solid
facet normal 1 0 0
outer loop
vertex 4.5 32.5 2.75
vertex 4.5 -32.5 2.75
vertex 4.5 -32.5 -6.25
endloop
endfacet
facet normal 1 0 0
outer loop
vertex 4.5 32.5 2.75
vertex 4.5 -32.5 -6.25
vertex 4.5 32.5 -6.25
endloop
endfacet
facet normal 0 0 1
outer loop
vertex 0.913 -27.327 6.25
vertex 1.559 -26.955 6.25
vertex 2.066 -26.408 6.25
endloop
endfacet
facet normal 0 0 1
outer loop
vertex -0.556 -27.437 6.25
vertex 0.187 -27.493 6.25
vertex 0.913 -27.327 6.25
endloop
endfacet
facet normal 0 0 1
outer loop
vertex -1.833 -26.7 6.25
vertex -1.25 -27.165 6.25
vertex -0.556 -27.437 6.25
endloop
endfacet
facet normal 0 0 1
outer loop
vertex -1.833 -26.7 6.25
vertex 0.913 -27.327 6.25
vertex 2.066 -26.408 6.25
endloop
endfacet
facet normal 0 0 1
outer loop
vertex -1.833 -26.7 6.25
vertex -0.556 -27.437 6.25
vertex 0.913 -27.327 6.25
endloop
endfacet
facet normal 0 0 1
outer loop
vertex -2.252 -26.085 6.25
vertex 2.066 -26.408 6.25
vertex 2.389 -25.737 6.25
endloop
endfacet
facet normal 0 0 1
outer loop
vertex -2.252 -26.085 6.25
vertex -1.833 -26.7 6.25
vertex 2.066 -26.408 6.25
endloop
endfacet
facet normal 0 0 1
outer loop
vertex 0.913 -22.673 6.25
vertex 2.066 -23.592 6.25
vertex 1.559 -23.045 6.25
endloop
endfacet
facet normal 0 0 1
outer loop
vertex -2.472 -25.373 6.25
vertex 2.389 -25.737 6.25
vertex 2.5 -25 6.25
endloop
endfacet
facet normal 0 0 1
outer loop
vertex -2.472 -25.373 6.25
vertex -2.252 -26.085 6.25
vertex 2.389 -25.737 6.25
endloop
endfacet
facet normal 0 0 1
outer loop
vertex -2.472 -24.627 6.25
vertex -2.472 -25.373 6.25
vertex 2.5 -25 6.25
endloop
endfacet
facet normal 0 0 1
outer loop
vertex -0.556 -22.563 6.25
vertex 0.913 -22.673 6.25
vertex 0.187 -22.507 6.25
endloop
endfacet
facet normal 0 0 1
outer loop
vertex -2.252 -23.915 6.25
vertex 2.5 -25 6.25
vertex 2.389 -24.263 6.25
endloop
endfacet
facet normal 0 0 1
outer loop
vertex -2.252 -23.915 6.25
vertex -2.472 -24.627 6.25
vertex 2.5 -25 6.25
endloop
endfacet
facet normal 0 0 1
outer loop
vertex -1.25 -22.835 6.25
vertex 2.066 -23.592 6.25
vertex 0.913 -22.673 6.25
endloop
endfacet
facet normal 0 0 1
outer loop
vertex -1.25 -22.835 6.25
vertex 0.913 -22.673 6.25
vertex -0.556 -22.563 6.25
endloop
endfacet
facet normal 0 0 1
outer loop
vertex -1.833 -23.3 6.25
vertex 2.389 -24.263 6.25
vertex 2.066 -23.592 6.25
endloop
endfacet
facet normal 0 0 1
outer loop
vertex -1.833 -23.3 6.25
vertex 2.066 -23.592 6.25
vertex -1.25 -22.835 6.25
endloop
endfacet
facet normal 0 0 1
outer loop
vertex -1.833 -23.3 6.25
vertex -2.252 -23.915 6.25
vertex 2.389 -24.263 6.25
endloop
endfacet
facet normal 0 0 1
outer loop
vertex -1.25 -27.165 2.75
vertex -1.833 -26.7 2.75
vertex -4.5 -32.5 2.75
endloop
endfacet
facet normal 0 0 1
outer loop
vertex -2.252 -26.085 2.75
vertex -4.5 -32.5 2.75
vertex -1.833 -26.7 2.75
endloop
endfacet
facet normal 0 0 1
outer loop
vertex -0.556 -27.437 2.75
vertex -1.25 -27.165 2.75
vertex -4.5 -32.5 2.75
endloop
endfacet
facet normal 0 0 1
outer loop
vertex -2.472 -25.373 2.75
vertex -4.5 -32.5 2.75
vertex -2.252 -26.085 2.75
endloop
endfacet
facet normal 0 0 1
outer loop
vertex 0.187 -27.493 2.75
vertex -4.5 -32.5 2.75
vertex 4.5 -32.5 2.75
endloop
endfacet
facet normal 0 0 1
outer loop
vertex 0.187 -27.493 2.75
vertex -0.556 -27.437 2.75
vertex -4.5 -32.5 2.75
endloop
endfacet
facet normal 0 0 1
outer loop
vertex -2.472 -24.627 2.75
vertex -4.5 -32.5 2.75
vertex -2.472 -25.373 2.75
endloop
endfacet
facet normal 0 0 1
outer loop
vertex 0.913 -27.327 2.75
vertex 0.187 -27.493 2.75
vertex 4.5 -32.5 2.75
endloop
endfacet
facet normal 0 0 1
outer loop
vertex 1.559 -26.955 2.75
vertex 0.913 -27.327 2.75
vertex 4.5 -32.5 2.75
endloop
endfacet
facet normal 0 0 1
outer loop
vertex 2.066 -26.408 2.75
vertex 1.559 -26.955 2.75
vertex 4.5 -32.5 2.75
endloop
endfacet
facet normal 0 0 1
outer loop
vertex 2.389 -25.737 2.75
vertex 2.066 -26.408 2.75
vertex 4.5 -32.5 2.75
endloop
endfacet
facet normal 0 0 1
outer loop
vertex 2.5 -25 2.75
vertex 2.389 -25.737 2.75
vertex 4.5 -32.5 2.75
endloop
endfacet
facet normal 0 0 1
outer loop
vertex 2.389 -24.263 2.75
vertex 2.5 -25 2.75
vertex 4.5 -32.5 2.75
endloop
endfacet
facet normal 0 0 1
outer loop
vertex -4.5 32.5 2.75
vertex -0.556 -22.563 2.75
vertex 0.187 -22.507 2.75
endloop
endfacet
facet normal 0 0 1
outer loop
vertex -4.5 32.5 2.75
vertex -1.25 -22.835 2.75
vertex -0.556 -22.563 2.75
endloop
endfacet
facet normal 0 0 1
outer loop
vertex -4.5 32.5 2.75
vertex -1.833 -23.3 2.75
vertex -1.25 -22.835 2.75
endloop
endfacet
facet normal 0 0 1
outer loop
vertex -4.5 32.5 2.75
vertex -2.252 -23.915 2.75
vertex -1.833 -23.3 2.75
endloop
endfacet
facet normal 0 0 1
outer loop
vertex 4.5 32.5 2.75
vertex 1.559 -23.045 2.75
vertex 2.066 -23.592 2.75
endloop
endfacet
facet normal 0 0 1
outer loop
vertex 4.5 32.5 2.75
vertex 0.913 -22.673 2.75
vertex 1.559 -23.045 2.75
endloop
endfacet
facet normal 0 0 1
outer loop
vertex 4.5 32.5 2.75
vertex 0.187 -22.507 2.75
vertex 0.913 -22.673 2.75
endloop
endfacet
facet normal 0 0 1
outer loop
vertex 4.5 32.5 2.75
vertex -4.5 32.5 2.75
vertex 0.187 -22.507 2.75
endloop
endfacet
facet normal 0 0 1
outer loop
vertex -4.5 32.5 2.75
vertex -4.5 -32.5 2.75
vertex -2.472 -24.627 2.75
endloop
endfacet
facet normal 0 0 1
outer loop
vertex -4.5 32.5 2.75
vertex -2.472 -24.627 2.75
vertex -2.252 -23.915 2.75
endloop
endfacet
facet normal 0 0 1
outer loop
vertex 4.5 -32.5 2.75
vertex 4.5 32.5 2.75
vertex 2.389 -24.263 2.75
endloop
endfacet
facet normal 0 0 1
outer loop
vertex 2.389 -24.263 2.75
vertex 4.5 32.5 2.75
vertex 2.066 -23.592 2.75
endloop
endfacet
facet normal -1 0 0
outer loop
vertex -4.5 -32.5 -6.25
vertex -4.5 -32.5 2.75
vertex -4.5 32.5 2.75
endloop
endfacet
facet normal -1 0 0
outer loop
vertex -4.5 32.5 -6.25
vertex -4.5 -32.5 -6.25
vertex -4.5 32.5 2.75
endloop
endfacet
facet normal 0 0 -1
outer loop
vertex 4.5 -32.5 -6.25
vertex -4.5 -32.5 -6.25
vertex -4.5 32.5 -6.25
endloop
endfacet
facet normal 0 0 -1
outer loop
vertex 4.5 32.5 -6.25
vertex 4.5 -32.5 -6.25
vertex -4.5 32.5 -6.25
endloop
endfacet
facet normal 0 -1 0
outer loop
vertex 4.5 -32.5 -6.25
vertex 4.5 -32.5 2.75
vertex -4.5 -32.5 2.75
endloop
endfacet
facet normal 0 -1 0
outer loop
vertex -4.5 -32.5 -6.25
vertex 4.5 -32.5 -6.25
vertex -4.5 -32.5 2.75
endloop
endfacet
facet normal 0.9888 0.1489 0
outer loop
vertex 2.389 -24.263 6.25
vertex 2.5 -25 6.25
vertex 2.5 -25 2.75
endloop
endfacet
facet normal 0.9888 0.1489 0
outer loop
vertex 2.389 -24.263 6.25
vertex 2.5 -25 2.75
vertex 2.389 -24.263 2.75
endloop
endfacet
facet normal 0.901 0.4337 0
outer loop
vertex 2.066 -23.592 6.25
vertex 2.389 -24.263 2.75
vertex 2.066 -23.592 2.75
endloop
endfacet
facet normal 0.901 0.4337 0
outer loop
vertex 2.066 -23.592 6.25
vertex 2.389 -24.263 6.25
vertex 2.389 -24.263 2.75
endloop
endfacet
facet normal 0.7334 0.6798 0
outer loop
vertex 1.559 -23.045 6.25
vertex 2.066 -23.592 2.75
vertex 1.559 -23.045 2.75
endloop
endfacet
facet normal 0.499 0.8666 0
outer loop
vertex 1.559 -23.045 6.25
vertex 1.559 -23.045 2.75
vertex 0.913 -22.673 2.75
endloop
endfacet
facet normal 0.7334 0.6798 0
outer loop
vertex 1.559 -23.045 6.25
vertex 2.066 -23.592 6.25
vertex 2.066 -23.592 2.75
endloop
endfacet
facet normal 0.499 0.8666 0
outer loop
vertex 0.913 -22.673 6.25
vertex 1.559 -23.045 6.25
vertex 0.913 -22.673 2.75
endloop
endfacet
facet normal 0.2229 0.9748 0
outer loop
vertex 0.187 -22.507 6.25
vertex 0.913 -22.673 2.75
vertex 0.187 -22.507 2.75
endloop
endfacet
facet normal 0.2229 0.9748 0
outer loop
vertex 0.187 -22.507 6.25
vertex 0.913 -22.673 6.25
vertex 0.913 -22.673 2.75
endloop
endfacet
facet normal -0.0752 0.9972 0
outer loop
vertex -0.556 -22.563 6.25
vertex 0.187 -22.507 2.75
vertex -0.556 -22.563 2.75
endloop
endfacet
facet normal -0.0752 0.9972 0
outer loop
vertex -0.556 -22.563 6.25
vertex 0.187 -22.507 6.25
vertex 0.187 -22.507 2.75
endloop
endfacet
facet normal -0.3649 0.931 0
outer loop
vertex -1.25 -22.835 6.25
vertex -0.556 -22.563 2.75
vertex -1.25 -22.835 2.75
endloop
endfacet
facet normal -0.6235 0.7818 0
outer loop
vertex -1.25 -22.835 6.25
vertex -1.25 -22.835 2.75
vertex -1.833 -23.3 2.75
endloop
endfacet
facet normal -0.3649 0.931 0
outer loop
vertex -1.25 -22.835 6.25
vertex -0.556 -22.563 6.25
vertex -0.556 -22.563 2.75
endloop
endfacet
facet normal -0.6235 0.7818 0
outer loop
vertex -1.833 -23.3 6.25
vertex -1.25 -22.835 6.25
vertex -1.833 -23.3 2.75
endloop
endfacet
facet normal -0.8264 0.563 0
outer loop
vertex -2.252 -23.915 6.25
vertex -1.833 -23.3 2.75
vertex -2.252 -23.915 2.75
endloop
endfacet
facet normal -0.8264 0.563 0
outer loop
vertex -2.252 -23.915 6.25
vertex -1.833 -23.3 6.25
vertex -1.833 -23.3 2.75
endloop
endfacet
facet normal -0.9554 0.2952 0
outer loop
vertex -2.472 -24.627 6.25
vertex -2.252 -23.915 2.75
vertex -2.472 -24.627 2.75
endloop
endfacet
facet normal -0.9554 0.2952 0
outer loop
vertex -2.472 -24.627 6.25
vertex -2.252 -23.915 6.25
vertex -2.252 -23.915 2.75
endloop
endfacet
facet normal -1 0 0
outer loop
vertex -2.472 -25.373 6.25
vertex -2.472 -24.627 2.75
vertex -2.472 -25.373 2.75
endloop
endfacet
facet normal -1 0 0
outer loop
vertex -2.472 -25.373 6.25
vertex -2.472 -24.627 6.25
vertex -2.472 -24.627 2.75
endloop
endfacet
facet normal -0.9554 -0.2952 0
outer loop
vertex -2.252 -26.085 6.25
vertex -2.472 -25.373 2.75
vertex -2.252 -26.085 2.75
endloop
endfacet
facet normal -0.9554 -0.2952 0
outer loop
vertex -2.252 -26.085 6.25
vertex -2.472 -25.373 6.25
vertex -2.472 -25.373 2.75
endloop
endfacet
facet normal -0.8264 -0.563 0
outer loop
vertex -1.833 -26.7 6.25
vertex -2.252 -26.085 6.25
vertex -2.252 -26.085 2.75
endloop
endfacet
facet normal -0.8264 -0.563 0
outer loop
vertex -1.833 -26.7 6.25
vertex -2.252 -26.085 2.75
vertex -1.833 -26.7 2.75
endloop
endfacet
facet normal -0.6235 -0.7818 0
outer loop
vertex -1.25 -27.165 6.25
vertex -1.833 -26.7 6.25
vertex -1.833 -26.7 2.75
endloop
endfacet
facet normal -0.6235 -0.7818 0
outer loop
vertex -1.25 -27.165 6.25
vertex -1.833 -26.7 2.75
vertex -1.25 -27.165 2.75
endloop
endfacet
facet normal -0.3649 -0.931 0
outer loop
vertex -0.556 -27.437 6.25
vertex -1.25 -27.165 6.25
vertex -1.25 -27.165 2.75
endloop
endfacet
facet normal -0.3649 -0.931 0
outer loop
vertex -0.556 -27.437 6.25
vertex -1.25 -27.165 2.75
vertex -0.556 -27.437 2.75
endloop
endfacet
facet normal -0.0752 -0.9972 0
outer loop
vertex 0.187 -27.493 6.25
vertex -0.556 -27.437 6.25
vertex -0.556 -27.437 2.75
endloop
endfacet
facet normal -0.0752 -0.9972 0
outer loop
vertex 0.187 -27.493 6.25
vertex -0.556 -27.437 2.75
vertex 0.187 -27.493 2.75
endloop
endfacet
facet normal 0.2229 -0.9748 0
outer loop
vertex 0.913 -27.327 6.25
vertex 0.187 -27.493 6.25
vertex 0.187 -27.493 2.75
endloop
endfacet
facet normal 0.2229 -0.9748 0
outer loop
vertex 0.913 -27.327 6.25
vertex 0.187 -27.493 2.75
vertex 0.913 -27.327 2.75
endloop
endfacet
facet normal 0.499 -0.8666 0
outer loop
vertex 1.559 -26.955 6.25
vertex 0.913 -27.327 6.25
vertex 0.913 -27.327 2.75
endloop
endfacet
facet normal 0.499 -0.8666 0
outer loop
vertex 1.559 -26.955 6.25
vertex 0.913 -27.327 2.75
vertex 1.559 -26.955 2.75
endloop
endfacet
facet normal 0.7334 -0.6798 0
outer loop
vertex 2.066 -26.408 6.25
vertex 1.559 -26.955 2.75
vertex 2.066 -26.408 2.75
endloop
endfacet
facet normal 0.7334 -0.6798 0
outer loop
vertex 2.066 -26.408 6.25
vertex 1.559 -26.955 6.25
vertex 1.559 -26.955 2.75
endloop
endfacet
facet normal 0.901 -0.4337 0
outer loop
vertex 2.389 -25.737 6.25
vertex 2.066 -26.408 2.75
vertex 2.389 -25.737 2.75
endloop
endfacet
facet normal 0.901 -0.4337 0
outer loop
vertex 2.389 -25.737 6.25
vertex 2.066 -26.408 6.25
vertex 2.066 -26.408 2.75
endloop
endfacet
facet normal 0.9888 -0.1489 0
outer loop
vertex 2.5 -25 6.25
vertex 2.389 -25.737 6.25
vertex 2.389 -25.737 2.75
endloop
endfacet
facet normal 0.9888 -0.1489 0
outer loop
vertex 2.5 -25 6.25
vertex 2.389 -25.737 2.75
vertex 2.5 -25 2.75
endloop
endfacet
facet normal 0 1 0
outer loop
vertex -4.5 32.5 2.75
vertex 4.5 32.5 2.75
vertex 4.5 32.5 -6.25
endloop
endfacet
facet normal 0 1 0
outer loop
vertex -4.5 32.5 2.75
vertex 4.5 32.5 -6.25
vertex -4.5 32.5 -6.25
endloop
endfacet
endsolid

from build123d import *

# Parameters (mm, degrees)
SKETCH1_W           = 65
SKETCH1_H           = 9
BOSS_EXTRUDE1_DEPTH = 6.25
SKETCH3_W           = 9
SKETCH3_H           = 65
SKETCH3_R           = 2.5
CUT_EXTRUDE2_DEPTH  = 3.5


with BuildPart() as part:
    # Sketch1 → Boss-Extrude1 (new, symmetric)
    with BuildSketch(Plane(origin=(0, 0, 0), x_dir=(0, 1, 0), z_dir=(0, 0, 1))):
        Rectangle(SKETCH1_W, SKETCH1_H)
    extrude(amount=BOSS_EXTRUDE1_DEPTH, both=True)

    # Sketch3 → Cut-Extrude2 (cut)
    with BuildSketch(Plane.XY.offset(6.25)):
        Rectangle(SKETCH3_W, SKETCH3_H)
        with Locations((0, -25)):
            Circle(SKETCH3_R, mode=Mode.SUBTRACT)
    extrude(amount=-CUT_EXTRUDE2_DEPTH, mode=Mode.SUBTRACT)


solid = part.part
